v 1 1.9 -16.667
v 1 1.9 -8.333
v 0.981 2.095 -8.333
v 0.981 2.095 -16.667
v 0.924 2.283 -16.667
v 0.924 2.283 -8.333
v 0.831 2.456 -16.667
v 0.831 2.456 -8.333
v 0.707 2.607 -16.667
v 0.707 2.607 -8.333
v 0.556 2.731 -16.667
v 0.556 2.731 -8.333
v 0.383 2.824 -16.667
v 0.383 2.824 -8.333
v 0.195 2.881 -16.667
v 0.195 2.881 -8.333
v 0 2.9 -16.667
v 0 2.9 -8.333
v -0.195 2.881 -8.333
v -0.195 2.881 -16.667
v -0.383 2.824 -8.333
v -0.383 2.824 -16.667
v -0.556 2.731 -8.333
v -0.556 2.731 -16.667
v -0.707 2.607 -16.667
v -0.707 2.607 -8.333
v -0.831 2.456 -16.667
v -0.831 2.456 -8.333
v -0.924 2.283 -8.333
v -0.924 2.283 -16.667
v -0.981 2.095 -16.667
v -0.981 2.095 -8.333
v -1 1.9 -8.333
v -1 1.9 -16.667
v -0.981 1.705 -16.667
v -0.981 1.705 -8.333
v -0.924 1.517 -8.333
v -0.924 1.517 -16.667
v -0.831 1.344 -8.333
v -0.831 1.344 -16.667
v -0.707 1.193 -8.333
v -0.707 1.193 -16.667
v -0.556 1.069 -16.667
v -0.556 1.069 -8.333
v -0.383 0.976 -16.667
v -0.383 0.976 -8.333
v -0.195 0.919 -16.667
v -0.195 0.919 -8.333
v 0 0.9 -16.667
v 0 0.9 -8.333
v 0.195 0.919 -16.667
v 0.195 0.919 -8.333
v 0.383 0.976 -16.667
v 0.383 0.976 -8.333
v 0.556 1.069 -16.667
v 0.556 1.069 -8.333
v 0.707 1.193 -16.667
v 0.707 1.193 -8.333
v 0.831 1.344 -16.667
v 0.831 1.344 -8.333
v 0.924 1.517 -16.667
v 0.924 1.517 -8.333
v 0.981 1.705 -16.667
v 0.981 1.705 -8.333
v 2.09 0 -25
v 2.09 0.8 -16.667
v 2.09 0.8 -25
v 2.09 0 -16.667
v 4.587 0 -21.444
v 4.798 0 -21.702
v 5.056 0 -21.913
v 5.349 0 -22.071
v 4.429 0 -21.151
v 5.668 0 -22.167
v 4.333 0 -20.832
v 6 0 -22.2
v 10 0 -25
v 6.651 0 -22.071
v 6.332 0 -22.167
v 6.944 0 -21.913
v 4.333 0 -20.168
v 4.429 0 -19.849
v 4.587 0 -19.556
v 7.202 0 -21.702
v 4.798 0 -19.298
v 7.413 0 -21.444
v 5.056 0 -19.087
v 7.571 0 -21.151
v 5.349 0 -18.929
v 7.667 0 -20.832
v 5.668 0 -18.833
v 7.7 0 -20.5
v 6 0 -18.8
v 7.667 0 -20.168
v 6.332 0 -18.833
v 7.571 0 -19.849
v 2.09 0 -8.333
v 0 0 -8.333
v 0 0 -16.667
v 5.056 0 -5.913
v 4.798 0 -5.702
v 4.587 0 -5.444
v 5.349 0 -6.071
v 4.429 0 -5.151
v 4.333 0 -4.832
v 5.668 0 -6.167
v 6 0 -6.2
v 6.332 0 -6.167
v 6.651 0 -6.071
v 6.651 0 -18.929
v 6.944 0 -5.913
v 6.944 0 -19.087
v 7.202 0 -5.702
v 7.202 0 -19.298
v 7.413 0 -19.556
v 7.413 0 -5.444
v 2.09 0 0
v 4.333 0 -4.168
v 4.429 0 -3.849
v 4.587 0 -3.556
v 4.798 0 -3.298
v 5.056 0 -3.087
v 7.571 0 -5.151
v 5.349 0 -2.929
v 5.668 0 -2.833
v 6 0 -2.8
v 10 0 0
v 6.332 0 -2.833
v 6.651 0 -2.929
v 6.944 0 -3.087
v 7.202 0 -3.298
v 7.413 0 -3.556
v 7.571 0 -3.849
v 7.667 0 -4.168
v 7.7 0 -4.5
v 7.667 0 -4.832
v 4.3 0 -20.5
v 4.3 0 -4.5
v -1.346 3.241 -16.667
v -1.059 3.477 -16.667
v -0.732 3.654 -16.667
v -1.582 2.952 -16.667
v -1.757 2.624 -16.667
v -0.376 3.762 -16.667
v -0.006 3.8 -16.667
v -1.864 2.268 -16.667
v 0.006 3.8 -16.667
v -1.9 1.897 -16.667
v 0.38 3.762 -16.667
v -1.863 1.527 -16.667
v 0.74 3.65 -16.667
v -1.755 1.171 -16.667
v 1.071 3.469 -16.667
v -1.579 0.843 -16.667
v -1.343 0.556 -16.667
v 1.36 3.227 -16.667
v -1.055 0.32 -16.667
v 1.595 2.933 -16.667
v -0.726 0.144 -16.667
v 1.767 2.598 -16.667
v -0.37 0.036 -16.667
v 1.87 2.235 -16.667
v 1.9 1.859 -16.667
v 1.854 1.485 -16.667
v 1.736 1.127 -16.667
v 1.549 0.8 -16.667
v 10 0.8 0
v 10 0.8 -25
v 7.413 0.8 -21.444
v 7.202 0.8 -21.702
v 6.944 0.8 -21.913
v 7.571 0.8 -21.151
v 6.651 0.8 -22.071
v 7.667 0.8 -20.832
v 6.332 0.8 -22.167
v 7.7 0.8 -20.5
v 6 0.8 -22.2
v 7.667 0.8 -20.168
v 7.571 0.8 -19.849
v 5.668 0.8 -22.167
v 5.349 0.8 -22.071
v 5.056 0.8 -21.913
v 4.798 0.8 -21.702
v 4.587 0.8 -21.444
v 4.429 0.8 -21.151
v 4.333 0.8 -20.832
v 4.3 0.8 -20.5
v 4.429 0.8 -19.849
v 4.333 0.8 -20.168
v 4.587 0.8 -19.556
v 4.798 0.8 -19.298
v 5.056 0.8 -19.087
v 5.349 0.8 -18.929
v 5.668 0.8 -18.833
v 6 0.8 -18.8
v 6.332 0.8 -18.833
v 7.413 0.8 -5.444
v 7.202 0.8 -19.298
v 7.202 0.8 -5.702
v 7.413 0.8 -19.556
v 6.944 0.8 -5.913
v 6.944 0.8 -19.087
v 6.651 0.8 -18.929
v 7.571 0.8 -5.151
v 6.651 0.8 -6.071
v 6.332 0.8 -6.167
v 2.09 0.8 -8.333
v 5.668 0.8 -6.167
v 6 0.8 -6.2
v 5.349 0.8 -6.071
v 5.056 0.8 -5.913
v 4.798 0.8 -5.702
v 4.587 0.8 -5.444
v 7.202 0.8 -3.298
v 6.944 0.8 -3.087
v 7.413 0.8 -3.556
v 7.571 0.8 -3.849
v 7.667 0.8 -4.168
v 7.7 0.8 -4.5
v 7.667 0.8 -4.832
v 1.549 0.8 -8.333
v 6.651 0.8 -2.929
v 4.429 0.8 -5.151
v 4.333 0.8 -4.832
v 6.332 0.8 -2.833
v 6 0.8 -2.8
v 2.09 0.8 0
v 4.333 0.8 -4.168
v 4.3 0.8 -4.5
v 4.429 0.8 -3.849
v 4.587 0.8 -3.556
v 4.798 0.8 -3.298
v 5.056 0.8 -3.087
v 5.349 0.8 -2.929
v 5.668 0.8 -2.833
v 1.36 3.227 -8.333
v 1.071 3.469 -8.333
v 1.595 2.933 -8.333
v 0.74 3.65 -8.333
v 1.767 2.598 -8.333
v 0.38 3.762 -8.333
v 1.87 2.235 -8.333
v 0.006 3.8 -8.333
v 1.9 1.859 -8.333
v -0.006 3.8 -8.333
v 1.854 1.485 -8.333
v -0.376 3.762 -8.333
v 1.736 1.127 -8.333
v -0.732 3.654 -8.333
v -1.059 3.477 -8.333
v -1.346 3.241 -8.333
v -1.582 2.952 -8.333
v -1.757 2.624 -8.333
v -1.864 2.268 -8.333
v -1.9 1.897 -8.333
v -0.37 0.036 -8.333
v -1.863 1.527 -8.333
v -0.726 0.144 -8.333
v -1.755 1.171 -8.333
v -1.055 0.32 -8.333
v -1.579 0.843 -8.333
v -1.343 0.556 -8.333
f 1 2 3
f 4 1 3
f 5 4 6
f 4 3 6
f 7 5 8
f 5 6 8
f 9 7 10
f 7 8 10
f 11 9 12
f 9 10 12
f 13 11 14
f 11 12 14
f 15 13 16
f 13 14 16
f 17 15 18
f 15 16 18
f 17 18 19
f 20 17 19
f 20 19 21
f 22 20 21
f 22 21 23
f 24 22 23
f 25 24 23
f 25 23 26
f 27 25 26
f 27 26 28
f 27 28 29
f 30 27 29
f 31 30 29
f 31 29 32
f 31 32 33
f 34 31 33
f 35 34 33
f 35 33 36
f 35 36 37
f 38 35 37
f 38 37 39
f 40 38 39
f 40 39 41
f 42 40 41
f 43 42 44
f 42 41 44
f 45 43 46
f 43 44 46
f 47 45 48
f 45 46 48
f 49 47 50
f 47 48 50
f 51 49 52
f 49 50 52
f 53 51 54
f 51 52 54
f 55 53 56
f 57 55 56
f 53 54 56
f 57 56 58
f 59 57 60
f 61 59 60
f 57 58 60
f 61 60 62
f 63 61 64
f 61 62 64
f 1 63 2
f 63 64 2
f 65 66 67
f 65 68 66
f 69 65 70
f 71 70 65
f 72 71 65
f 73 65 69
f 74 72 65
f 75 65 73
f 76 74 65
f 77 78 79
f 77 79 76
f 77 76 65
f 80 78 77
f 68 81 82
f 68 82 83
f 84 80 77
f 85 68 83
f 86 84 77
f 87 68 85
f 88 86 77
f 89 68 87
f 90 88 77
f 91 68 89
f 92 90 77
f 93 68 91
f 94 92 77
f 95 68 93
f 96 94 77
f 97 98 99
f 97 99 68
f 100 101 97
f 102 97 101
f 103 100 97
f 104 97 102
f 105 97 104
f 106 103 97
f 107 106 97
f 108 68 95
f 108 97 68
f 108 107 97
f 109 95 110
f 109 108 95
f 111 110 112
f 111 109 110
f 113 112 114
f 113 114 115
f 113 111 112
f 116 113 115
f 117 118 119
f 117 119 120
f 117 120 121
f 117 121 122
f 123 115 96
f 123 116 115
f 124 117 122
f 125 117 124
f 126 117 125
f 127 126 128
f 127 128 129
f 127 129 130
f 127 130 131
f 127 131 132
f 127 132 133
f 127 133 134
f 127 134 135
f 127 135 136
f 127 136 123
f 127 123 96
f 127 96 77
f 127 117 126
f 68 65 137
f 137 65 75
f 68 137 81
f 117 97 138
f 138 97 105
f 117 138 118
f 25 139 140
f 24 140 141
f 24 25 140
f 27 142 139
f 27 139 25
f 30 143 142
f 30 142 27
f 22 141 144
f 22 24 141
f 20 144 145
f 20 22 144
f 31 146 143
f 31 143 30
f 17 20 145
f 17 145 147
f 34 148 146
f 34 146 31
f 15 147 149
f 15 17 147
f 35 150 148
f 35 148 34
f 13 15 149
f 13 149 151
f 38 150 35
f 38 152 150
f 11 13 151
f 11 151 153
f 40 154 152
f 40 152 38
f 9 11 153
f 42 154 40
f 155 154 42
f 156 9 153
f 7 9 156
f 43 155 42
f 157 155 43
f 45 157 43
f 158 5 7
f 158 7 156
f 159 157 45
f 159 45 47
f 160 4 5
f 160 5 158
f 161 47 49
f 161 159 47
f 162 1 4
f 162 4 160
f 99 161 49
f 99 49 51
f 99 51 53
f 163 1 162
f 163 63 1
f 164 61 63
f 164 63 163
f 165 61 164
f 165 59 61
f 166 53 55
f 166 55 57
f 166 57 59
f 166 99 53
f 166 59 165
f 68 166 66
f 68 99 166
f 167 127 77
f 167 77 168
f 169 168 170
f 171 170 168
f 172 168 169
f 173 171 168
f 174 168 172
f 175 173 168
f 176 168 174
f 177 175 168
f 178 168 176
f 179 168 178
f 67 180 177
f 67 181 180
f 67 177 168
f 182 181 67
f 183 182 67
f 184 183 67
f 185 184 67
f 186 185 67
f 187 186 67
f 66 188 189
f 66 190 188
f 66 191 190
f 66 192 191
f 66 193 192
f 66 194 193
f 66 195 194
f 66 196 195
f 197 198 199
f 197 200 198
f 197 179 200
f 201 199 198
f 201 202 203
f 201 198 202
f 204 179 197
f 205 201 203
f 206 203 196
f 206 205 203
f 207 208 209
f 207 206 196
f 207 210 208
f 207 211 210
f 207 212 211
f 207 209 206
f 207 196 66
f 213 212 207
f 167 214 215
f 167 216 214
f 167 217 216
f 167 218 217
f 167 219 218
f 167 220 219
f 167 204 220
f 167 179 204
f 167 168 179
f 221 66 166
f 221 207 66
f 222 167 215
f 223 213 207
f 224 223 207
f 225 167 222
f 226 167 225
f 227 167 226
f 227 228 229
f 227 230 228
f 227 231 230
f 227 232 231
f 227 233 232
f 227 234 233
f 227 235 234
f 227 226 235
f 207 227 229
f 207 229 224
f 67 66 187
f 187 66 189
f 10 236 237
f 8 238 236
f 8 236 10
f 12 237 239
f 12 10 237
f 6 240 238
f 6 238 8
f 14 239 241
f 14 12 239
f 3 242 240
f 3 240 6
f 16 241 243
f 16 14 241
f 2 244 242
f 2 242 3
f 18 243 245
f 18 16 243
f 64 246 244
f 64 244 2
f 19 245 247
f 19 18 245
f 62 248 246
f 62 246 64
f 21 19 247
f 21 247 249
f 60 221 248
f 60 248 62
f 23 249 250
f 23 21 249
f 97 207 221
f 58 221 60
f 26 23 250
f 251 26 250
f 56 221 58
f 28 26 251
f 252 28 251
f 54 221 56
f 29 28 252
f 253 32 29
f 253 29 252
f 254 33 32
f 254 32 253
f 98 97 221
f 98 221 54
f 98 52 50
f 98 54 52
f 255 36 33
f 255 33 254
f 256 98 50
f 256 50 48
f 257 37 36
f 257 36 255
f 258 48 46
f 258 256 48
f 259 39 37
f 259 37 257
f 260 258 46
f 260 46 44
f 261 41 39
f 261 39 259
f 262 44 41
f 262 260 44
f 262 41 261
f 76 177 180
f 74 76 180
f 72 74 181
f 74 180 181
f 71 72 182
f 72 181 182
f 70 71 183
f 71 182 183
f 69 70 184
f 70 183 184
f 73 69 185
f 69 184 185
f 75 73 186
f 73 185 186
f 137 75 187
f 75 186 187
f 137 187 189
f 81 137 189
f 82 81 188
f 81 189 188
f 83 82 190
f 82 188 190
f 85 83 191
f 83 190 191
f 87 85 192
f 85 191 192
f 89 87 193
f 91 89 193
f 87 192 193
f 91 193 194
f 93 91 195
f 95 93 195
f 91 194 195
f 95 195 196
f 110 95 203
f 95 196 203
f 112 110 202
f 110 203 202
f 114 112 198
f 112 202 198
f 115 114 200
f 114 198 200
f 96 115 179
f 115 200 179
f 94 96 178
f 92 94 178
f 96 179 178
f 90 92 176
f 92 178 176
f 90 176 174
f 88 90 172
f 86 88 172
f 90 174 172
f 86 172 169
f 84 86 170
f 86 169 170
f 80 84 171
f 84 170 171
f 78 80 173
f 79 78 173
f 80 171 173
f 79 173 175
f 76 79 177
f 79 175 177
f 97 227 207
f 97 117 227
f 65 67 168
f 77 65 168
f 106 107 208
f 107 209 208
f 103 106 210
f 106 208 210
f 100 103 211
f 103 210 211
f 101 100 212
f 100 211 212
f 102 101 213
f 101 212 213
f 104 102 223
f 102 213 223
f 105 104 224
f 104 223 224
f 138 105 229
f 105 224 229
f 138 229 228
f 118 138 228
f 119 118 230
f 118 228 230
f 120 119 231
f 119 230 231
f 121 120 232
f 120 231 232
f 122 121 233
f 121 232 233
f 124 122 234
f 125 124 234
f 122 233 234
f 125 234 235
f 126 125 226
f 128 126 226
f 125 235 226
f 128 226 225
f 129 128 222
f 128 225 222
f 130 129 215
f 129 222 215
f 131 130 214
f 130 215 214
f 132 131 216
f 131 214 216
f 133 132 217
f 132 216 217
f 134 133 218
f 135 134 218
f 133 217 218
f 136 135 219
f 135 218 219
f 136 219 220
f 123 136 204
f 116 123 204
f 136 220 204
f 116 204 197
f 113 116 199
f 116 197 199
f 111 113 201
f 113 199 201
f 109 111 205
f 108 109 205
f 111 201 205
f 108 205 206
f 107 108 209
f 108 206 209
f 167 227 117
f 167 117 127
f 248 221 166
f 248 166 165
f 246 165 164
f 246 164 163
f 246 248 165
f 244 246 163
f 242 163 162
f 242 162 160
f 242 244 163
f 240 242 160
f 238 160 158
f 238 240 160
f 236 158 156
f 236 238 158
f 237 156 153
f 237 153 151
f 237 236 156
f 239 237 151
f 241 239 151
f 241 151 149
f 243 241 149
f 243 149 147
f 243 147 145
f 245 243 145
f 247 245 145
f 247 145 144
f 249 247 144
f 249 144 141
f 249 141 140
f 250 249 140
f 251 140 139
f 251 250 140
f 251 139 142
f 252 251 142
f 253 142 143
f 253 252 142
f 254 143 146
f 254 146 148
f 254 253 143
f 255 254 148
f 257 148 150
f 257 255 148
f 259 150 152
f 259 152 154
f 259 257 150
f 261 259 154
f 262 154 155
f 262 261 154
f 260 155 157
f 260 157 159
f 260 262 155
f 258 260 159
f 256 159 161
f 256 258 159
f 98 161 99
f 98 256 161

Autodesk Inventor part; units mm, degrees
sketch "Sketch_15" plane through (0, 0, 0) normal (0, 0, 1) x (1, 0, 0)
  arc A0 (1.5492, 0.8) -> (0, 0) centre (0, 1.9) ccw
  line L0 (0, 0) -> (10, 0)
  line L1 (10, 0) -> (10, 0.8)
  line L2 (10, 0.8) -> (1.5492, 0.8)
  circle A1 centre (0, 1.9) radius 1
extrude "Extrusion1" add sketch "Sketch_15" against normal blind 25
sketch "Sketch_1" plane through (0, 0, 0) normal (0, 1, 0) x (-1, 0, 0)
  line L0 (6, -25) -> (6, 0)
  line L1 (6, 0) -> (-2.09, 0)
  line L2 (-2.09, 0) -> (-2.09, -8.3333)
  line L3 (-2.09, -8.3333) -> (2.09, -8.3333)
  line L4 (2.09, -8.3333) -> (2.09, -16.6667)
  line L5 (2.09, -16.6667) -> (-2.09, -16.6667)
  line L6 (-2.09, -16.6667) -> (-2.09, -25)
  line L7 (-2.09, -25) -> (6, -25)
extrude "Extrusion2" cut sketch "Sketch_1" along normal blind 3.8
sketch "Sketch3" plane through (10, 0, -25) normal (0, -1, 0) x (1, 0, 0)
  point P0 (-4, 4.5)
hole "Hole1" at (6, 0, -20.5) direction (0, 1, 0) diameter 3.4 depth 0.8
pattern_linear "Rectangular Pattern1" count 2 spacing 16 along (0, 0, 1) of "Hole1"
ref_plane "to_leaf2_XY" through (0, 1.9, 0) normal (0, 0, 1) x (1, 0, 0)
ref_plane "to_leaf2_YZ" through (0, 1.9, 0) normal (1, 0, 0) x (0, 1, 0)
ref_plane "to_leaf2_ZX" through (0, 1.9, 0) normal (0, 1, 0) x (0, 0, 1)
properties part number "HHS25-LEAF1"
